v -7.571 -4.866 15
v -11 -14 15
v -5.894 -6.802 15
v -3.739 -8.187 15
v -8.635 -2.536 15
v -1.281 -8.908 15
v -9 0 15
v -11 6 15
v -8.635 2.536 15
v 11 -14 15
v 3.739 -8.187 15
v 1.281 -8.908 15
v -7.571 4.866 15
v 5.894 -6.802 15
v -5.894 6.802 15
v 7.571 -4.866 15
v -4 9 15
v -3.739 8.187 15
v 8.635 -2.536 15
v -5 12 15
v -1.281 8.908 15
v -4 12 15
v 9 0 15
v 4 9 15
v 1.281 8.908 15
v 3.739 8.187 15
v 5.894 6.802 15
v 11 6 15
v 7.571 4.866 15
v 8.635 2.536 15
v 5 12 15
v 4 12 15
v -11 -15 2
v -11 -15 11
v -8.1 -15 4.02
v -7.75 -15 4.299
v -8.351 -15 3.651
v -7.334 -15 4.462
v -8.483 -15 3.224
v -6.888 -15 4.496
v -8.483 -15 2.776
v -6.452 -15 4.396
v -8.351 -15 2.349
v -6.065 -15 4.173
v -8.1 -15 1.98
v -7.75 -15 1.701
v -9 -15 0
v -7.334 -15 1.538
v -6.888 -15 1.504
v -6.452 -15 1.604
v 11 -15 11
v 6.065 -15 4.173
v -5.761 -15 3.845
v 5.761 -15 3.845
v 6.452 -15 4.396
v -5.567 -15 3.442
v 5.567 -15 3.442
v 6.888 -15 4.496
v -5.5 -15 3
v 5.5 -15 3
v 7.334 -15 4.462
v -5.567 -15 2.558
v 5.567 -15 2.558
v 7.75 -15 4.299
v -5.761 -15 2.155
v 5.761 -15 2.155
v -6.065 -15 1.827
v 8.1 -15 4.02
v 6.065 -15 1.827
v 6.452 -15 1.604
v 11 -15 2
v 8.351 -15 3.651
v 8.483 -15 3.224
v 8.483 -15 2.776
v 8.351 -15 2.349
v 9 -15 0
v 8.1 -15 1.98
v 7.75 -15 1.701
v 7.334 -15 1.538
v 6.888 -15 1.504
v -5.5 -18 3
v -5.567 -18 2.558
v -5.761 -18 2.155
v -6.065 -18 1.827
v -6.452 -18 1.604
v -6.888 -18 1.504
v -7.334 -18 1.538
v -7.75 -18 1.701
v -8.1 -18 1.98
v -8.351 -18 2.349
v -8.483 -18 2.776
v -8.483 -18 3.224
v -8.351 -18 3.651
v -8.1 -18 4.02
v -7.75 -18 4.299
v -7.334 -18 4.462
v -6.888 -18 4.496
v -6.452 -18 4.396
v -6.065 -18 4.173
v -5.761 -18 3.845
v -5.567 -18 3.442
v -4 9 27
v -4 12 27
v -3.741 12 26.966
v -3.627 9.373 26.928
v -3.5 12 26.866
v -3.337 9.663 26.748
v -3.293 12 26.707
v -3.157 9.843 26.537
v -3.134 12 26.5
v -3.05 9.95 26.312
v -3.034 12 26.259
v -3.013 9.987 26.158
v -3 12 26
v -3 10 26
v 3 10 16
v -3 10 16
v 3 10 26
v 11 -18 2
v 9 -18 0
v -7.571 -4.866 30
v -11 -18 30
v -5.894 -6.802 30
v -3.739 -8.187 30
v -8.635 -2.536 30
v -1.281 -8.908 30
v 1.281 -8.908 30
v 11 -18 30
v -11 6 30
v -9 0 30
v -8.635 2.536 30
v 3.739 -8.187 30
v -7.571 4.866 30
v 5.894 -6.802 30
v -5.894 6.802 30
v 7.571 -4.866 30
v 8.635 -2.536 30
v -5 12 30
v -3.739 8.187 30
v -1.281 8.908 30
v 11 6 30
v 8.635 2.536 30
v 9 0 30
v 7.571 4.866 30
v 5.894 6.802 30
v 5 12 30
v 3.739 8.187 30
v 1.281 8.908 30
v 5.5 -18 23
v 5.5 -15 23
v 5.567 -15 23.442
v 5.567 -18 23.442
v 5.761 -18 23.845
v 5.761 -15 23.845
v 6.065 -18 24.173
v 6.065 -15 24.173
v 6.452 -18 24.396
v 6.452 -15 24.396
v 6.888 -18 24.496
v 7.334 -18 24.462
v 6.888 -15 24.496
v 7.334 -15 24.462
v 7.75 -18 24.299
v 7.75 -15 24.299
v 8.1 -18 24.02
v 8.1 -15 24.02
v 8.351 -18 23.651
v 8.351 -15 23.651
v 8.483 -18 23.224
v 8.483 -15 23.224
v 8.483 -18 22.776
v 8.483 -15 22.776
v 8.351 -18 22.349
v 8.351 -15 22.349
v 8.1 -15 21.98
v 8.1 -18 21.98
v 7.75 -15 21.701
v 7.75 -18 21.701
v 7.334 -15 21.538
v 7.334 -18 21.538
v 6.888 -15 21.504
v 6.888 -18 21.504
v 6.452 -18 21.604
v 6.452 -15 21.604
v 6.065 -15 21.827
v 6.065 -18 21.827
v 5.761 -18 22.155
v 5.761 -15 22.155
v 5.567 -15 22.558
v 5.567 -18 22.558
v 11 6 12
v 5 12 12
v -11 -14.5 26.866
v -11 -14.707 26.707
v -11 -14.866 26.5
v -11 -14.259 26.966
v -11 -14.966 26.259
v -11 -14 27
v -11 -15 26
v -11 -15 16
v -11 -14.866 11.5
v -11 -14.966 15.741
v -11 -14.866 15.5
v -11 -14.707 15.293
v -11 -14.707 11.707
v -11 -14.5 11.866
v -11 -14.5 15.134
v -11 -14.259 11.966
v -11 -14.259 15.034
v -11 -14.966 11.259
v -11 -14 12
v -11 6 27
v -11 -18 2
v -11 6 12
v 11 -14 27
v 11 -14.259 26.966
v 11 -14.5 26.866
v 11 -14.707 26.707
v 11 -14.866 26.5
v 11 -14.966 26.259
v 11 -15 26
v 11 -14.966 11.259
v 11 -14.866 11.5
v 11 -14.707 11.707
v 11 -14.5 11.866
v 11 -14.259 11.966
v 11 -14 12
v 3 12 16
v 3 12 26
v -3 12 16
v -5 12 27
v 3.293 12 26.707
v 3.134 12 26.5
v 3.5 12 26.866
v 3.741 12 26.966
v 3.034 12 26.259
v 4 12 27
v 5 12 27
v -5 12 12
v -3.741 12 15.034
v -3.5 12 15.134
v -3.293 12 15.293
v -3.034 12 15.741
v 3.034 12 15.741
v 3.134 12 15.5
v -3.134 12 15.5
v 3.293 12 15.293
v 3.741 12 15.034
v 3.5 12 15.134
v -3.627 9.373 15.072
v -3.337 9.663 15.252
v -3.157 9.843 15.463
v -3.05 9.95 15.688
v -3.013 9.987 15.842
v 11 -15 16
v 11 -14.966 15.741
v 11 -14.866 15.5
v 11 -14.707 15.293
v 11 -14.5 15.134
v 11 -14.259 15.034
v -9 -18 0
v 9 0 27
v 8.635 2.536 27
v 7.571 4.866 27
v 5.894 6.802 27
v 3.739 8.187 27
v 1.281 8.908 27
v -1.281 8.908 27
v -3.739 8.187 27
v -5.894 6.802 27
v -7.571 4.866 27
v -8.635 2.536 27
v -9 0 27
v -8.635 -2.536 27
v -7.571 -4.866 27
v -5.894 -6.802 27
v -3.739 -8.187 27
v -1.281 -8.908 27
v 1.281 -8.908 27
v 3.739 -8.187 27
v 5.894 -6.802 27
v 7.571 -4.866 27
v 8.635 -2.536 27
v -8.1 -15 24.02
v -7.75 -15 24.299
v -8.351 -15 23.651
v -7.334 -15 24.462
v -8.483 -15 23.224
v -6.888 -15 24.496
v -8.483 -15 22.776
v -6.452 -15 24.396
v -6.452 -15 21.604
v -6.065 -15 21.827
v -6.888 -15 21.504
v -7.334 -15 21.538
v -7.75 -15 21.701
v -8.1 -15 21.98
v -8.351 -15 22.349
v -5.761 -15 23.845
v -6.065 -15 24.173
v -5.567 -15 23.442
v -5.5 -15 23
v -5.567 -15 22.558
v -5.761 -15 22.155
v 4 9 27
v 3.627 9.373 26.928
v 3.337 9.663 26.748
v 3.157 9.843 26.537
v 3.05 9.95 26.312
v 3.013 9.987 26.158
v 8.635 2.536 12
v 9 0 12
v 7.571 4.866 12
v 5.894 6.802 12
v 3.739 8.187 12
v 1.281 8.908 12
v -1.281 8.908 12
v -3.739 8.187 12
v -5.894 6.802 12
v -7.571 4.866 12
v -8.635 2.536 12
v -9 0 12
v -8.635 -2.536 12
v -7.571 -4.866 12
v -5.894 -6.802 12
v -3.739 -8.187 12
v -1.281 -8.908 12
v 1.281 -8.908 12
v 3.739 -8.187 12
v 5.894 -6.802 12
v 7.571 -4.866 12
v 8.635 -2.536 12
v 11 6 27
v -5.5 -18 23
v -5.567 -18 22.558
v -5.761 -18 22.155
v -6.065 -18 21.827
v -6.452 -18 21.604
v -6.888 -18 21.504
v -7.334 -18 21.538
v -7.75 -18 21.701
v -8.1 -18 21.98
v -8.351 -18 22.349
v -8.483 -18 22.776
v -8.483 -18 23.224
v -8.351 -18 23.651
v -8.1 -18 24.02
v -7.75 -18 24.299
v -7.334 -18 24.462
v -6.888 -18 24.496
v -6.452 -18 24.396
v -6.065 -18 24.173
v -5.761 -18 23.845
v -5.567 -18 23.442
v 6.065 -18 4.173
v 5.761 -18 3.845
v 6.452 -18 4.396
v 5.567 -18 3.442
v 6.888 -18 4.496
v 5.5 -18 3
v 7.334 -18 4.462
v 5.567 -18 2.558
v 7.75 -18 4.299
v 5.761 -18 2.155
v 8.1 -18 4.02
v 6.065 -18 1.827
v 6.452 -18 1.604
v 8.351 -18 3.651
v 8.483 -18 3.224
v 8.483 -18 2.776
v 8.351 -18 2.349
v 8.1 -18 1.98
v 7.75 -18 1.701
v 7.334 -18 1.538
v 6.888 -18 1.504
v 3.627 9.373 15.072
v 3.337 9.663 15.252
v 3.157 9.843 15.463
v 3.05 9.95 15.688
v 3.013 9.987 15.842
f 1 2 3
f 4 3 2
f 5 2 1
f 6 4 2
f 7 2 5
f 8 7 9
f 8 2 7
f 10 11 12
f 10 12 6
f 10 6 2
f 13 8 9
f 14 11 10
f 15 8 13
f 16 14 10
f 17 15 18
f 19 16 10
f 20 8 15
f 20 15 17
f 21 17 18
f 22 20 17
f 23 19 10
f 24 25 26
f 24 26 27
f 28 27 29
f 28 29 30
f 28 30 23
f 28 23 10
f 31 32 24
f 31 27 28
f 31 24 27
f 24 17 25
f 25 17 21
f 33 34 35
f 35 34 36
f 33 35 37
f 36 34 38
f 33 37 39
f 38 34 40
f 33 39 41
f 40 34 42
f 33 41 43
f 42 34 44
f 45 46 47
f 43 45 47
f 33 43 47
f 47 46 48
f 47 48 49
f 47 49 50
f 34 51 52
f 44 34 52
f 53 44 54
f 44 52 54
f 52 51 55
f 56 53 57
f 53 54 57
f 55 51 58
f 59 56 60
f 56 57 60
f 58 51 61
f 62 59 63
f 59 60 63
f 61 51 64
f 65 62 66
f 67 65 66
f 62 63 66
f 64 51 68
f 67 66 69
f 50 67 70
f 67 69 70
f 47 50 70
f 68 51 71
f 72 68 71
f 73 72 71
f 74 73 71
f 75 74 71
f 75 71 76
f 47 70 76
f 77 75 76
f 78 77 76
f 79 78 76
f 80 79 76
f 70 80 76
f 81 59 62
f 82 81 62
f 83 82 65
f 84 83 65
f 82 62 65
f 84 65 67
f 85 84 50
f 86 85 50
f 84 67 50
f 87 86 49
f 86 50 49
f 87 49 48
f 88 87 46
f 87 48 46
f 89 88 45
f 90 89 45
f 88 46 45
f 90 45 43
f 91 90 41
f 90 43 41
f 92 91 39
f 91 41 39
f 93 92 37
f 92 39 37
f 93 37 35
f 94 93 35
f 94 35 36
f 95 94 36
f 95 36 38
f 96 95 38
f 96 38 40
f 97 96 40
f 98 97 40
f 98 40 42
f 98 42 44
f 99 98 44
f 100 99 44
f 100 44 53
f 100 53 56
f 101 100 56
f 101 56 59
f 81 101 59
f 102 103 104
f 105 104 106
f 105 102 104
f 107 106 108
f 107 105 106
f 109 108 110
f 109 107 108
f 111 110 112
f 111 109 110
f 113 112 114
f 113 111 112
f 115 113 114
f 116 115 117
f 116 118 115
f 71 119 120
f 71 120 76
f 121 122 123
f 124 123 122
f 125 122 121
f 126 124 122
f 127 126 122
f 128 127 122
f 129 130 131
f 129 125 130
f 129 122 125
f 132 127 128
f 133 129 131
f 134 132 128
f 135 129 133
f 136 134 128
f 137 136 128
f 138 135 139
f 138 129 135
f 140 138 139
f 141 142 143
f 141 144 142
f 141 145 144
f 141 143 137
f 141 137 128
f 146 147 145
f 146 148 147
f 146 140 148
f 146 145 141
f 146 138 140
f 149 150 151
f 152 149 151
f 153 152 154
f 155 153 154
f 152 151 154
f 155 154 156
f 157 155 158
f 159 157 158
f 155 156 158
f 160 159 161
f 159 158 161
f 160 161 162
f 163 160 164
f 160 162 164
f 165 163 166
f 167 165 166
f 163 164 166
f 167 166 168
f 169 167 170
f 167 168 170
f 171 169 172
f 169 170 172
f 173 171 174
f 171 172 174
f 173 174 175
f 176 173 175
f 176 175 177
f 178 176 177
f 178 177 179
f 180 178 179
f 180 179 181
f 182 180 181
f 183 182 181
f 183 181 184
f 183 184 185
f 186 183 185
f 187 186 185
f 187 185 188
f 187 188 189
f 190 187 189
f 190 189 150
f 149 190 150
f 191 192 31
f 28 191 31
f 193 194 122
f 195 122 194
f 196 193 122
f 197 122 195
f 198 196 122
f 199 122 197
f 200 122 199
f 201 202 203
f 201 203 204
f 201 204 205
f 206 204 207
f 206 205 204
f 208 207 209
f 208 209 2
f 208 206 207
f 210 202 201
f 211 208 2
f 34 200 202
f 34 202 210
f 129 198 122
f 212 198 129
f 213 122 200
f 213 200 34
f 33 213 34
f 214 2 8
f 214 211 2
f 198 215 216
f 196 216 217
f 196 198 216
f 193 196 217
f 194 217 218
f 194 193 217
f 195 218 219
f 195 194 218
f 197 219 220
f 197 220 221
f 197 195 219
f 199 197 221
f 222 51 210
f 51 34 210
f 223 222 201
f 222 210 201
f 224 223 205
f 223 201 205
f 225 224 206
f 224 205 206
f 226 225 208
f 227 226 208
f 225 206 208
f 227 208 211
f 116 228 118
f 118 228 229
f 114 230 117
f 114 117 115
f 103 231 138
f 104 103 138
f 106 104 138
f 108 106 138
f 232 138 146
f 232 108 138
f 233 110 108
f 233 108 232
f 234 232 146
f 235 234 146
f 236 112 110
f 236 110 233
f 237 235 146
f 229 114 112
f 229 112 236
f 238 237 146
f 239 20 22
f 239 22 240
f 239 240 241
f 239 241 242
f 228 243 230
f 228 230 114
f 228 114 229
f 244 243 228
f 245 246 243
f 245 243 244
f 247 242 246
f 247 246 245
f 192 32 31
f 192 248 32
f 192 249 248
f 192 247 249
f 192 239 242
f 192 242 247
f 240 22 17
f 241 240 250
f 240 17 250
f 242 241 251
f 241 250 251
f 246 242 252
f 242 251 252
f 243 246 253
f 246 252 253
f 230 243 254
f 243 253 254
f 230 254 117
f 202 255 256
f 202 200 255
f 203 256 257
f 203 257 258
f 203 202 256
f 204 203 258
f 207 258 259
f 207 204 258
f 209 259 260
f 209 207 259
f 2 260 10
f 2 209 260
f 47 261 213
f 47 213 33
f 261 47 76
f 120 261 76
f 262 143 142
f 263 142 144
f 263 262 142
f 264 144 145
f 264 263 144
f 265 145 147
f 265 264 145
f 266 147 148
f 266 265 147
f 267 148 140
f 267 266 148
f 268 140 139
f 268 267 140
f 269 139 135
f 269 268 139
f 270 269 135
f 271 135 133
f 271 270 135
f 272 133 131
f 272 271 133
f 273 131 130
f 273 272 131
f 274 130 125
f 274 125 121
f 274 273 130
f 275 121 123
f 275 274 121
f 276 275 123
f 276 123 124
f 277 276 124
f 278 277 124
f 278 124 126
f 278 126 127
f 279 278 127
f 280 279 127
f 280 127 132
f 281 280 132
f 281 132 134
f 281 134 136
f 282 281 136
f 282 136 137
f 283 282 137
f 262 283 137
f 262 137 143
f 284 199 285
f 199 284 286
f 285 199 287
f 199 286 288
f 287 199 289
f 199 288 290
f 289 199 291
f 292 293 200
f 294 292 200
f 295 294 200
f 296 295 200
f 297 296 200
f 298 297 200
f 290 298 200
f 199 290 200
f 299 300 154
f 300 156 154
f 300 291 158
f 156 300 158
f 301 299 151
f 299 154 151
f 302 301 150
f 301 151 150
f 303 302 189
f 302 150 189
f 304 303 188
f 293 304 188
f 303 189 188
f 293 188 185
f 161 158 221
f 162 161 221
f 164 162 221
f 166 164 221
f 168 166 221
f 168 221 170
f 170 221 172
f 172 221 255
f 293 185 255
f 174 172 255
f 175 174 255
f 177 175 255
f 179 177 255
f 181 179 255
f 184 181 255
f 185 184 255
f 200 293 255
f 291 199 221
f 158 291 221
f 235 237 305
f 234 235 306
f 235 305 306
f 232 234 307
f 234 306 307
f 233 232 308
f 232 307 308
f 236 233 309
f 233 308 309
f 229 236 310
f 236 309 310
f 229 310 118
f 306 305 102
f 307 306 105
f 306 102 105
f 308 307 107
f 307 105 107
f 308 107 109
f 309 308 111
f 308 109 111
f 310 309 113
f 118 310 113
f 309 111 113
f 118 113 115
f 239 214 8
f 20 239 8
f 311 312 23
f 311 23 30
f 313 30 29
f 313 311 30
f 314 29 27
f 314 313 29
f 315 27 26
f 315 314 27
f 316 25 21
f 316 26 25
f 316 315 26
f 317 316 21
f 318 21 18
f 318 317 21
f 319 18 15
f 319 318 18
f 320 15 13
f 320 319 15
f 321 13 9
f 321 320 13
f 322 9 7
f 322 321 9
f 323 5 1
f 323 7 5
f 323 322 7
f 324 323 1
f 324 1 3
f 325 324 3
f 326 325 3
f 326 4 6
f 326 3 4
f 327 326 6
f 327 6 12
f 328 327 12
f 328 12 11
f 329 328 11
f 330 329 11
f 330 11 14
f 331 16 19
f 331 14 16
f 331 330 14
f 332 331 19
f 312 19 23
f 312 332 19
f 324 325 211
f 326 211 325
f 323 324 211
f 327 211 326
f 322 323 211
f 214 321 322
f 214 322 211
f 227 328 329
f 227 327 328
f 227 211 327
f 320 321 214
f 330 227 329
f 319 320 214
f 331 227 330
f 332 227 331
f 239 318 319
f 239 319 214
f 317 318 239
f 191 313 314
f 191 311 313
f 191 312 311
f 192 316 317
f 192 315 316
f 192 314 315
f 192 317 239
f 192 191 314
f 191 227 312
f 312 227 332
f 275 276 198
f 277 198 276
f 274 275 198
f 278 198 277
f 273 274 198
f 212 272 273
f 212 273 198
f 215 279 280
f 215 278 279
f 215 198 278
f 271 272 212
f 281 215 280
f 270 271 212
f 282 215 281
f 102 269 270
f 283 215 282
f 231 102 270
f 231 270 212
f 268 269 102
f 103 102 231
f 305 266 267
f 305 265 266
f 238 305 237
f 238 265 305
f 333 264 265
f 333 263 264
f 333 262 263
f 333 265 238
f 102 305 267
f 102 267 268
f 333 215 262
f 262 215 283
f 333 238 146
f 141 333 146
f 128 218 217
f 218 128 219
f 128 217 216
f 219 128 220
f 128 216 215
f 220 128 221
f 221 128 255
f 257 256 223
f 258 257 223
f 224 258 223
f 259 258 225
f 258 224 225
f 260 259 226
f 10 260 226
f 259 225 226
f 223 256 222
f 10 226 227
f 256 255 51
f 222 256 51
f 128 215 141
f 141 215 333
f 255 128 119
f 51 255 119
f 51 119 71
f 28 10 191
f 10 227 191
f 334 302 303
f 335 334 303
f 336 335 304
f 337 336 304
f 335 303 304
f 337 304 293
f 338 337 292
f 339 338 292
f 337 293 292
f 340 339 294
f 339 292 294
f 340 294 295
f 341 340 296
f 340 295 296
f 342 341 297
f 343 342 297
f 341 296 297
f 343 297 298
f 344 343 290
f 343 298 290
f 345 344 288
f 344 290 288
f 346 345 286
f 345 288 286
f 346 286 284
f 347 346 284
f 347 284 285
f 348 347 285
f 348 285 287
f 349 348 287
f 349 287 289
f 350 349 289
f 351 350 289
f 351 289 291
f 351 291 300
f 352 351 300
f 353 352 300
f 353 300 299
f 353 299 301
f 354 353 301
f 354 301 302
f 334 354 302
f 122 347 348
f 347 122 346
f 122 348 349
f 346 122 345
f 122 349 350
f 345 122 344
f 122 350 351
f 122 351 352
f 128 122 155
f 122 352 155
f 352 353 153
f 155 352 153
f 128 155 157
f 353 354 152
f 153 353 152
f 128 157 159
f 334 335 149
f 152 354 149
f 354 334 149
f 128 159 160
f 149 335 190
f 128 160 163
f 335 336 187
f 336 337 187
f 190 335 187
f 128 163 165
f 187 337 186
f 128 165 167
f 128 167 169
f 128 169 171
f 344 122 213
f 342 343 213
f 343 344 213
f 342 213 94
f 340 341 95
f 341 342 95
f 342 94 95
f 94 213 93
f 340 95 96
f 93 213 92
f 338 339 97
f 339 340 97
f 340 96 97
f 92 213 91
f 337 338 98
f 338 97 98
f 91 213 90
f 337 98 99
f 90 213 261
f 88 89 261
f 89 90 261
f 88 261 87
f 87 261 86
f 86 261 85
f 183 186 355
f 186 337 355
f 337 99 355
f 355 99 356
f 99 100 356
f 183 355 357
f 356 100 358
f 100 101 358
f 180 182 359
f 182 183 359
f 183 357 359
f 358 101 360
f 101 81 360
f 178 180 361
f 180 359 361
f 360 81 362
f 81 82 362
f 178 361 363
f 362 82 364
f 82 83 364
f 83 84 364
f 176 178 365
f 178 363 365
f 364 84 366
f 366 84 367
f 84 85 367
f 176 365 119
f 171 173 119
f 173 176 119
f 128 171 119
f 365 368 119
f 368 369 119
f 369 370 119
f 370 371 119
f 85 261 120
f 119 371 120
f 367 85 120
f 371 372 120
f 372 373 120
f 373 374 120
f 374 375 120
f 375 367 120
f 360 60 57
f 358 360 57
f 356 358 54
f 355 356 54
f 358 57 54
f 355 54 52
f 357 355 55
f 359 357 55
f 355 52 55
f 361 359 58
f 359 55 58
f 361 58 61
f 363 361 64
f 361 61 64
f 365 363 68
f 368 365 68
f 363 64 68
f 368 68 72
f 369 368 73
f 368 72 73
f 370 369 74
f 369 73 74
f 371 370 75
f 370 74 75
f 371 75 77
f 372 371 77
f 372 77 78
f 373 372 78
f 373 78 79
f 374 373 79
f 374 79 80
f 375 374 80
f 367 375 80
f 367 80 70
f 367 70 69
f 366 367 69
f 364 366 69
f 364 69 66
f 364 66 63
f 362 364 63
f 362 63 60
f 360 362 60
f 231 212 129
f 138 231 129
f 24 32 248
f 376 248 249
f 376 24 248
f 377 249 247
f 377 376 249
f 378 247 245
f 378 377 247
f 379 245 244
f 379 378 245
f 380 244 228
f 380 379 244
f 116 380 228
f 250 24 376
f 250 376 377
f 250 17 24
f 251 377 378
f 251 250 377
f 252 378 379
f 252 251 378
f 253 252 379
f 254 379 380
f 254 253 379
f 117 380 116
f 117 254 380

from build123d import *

# Parameters (mm, degrees)
SKETCH_1_W          = 22
SKETCH_1_H          = 30
SKETCH_1_R          = 9
EXTRUDE_2_DEPTH     = 30
SKETCH_4_W          = 12
SKETCH_4_H          = 25
SKETCH_4_H_2        = 30
CUT_EXTRUDE_3_DEPTH = 42.32795664
CHAMFER_2_SIZE      = 2
CUT_EXTRUDE_4_REACH = 45.829
SKETCH_6_R          = 1.5
CUT_EXTRUDE_5_DEPTH = 42.833001327
CHAMFER_3_SIZE      = 6
FILLET_1_R          = 1


with BuildPart() as part:
    # 草图1 → 凸台-拉伸2 (new body)
    with BuildSketch(Plane.XY):
        with Locations((0, -3)):
            Rectangle(SKETCH_1_W, SKETCH_1_H)
        Circle(SKETCH_1_R, mode=Mode.SUBTRACT)
    extrude(amount=EXTRUDE_2_DEPTH)

    # 草图4 → 切除-拉伸3 (cut, through all)
    with BuildSketch(Plane(origin=(11, 0, 0), x_dir=(0, 0, -1), z_dir=(1, 0, 0))):
        with Locations((-21, -2.5)):
            Rectangle(SKETCH_4_W, SKETCH_4_H)
        with Locations((-6, 0)):
            Rectangle(SKETCH_4_W, SKETCH_4_H_2)
    extrude(amount=-CUT_EXTRUDE_3_DEPTH, mode=Mode.SUBTRACT)

    # 倒角2
    chamfer_2_edges = [part.edges().sort_by_distance(p)[0] for p in [
        (-11, -16.5, 0),
        (11, -16.5, 0),
    ]]
    chamfer(chamfer_2_edges, length=CHAMFER_2_SIZE)

    # 草图5 → 切除-拉伸4 (cut, up to next)
    with BuildSketch(Plane(origin=(0, 12, 0), x_dir=(1, 0, 0), z_dir=(0, 1, 0)), mode=Mode.PRIVATE) as cut_extrude_4_sk1:
        with BuildLine():
            Line((3, -27), (9, -27))
            ThreePointArc((9, -27), (4.757359313, -25.242640687), (3, -21))
            Line((3, -21), (3, -27))
        make_face()
    cut_extrude_4_tool1 = extrude(cut_extrude_4_sk1.sketch, amount=-CUT_EXTRUDE_4_REACH, mode=Mode.PRIVATE) & part.part
    # 草图5 → 切除-拉伸4 (cut, up to next)
    with BuildSketch(Plane(origin=(0, 12, 0), x_dir=(1, 0, 0), z_dir=(0, 1, 0)), mode=Mode.PRIVATE) as cut_extrude_4_sk2:
        with BuildLine():
            Line((9, -27), (11, -27))
            Line((11, -27), (11, -15))
            Line((11, -15), (9, -15))
            ThreePointArc((9, -15), (4.757359313, -16.757359313), (3, -21))
            ThreePointArc((3, -21), (4.757359313, -25.242640687), (9, -27))
        make_face()
    cut_extrude_4_tool2 = extrude(cut_extrude_4_sk2.sketch, amount=-CUT_EXTRUDE_4_REACH, mode=Mode.PRIVATE) & part.part
    # 草图5 → 切除-拉伸4 (cut, up to next)
    with BuildSketch(Plane(origin=(0, 12, 0), x_dir=(1, 0, 0), z_dir=(0, 1, 0)), mode=Mode.PRIVATE) as cut_extrude_4_sk3:
        with BuildLine():
            Line((3, -15), (3, -21))
            ThreePointArc((3, -21), (4.757359313, -16.757359313), (9, -15))
            Line((9, -15), (3, -15))
        make_face()
    cut_extrude_4_tool3 = extrude(cut_extrude_4_sk3.sketch, amount=-CUT_EXTRUDE_4_REACH, mode=Mode.PRIVATE) & part.part
    cut_extrude_4_1 = cut_extrude_4_tool1.solids().sort_by_distance((4.340208, 12, 25.659792))[0]
    add(cut_extrude_4_1, mode=Mode.SUBTRACT)
    cut_extrude_4_2 = cut_extrude_4_tool2.solids().sort_by_distance((7.510217, 12, 21))[0]
    add(cut_extrude_4_2, mode=Mode.SUBTRACT)
    cut_extrude_4_3 = cut_extrude_4_tool3.solids().sort_by_distance((4.340208, 12, 16.340208))[0]
    add(cut_extrude_4_3, mode=Mode.SUBTRACT)
    cut_extrude_4 = cut_extrude_4_1 + cut_extrude_4_2 + cut_extrude_4_3  # 切除-拉伸4 as one shape, for the pattern or mirror that repeats it

    # 镜向1: 切除-拉伸4 across plane
    add(cut_extrude_4.mirror(Plane(origin=(0, 0, 0), x_dir=(0, 0, 1), z_dir=(1, 0, 0))), mode=Mode.SUBTRACT)

    # 草图6 → 切除-拉伸5 (cut, through all)
    with BuildSketch(Plane(origin=(0, -15, 0), x_dir=(1, 0, 0), z_dir=(0, 1, 0))):
        with Locations(Location((7, -23, 0), (0, 0, 180))):
            Circle(SKETCH_6_R)
        with Locations(Location((7, -3, 0), (0, 0, 180))):
            Circle(SKETCH_6_R)
        with Locations((-7, -3)):
            Circle(SKETCH_6_R)
        with Locations((-7, -23)):
            Circle(SKETCH_6_R)
    extrude(amount=-CUT_EXTRUDE_5_DEPTH, mode=Mode.SUBTRACT)

    # 倒角3
    chamfer_3_edges = [part.edges().sort_by_distance(p)[0] for p in [
        (11, 12, 13.5),
        (-11, 12, 28.5),
        (11, 12, 28.5),
        (-11, 12, 13.5),
    ]]
    chamfer(chamfer_3_edges, length=CHAMFER_3_SIZE)

    # 圆角1
    fillet_1_edges = [part.edges().sort_by_distance(p)[0] for p in [
        (0, -15, 27),
        (0, -15, 15),
        (0, -15, 12),
        (3, 11, 27),
        (3, 11, 15),
        (0, 10, 15),
        (0, 10, 27),
        (-3, 11, 27),
        (-3, 11, 15),
    ]]
    fillet(fillet_1_edges, radius=FILLET_1_R - 0.0001)  # a hair under: the kernel refuses the full size


solid = part.part
